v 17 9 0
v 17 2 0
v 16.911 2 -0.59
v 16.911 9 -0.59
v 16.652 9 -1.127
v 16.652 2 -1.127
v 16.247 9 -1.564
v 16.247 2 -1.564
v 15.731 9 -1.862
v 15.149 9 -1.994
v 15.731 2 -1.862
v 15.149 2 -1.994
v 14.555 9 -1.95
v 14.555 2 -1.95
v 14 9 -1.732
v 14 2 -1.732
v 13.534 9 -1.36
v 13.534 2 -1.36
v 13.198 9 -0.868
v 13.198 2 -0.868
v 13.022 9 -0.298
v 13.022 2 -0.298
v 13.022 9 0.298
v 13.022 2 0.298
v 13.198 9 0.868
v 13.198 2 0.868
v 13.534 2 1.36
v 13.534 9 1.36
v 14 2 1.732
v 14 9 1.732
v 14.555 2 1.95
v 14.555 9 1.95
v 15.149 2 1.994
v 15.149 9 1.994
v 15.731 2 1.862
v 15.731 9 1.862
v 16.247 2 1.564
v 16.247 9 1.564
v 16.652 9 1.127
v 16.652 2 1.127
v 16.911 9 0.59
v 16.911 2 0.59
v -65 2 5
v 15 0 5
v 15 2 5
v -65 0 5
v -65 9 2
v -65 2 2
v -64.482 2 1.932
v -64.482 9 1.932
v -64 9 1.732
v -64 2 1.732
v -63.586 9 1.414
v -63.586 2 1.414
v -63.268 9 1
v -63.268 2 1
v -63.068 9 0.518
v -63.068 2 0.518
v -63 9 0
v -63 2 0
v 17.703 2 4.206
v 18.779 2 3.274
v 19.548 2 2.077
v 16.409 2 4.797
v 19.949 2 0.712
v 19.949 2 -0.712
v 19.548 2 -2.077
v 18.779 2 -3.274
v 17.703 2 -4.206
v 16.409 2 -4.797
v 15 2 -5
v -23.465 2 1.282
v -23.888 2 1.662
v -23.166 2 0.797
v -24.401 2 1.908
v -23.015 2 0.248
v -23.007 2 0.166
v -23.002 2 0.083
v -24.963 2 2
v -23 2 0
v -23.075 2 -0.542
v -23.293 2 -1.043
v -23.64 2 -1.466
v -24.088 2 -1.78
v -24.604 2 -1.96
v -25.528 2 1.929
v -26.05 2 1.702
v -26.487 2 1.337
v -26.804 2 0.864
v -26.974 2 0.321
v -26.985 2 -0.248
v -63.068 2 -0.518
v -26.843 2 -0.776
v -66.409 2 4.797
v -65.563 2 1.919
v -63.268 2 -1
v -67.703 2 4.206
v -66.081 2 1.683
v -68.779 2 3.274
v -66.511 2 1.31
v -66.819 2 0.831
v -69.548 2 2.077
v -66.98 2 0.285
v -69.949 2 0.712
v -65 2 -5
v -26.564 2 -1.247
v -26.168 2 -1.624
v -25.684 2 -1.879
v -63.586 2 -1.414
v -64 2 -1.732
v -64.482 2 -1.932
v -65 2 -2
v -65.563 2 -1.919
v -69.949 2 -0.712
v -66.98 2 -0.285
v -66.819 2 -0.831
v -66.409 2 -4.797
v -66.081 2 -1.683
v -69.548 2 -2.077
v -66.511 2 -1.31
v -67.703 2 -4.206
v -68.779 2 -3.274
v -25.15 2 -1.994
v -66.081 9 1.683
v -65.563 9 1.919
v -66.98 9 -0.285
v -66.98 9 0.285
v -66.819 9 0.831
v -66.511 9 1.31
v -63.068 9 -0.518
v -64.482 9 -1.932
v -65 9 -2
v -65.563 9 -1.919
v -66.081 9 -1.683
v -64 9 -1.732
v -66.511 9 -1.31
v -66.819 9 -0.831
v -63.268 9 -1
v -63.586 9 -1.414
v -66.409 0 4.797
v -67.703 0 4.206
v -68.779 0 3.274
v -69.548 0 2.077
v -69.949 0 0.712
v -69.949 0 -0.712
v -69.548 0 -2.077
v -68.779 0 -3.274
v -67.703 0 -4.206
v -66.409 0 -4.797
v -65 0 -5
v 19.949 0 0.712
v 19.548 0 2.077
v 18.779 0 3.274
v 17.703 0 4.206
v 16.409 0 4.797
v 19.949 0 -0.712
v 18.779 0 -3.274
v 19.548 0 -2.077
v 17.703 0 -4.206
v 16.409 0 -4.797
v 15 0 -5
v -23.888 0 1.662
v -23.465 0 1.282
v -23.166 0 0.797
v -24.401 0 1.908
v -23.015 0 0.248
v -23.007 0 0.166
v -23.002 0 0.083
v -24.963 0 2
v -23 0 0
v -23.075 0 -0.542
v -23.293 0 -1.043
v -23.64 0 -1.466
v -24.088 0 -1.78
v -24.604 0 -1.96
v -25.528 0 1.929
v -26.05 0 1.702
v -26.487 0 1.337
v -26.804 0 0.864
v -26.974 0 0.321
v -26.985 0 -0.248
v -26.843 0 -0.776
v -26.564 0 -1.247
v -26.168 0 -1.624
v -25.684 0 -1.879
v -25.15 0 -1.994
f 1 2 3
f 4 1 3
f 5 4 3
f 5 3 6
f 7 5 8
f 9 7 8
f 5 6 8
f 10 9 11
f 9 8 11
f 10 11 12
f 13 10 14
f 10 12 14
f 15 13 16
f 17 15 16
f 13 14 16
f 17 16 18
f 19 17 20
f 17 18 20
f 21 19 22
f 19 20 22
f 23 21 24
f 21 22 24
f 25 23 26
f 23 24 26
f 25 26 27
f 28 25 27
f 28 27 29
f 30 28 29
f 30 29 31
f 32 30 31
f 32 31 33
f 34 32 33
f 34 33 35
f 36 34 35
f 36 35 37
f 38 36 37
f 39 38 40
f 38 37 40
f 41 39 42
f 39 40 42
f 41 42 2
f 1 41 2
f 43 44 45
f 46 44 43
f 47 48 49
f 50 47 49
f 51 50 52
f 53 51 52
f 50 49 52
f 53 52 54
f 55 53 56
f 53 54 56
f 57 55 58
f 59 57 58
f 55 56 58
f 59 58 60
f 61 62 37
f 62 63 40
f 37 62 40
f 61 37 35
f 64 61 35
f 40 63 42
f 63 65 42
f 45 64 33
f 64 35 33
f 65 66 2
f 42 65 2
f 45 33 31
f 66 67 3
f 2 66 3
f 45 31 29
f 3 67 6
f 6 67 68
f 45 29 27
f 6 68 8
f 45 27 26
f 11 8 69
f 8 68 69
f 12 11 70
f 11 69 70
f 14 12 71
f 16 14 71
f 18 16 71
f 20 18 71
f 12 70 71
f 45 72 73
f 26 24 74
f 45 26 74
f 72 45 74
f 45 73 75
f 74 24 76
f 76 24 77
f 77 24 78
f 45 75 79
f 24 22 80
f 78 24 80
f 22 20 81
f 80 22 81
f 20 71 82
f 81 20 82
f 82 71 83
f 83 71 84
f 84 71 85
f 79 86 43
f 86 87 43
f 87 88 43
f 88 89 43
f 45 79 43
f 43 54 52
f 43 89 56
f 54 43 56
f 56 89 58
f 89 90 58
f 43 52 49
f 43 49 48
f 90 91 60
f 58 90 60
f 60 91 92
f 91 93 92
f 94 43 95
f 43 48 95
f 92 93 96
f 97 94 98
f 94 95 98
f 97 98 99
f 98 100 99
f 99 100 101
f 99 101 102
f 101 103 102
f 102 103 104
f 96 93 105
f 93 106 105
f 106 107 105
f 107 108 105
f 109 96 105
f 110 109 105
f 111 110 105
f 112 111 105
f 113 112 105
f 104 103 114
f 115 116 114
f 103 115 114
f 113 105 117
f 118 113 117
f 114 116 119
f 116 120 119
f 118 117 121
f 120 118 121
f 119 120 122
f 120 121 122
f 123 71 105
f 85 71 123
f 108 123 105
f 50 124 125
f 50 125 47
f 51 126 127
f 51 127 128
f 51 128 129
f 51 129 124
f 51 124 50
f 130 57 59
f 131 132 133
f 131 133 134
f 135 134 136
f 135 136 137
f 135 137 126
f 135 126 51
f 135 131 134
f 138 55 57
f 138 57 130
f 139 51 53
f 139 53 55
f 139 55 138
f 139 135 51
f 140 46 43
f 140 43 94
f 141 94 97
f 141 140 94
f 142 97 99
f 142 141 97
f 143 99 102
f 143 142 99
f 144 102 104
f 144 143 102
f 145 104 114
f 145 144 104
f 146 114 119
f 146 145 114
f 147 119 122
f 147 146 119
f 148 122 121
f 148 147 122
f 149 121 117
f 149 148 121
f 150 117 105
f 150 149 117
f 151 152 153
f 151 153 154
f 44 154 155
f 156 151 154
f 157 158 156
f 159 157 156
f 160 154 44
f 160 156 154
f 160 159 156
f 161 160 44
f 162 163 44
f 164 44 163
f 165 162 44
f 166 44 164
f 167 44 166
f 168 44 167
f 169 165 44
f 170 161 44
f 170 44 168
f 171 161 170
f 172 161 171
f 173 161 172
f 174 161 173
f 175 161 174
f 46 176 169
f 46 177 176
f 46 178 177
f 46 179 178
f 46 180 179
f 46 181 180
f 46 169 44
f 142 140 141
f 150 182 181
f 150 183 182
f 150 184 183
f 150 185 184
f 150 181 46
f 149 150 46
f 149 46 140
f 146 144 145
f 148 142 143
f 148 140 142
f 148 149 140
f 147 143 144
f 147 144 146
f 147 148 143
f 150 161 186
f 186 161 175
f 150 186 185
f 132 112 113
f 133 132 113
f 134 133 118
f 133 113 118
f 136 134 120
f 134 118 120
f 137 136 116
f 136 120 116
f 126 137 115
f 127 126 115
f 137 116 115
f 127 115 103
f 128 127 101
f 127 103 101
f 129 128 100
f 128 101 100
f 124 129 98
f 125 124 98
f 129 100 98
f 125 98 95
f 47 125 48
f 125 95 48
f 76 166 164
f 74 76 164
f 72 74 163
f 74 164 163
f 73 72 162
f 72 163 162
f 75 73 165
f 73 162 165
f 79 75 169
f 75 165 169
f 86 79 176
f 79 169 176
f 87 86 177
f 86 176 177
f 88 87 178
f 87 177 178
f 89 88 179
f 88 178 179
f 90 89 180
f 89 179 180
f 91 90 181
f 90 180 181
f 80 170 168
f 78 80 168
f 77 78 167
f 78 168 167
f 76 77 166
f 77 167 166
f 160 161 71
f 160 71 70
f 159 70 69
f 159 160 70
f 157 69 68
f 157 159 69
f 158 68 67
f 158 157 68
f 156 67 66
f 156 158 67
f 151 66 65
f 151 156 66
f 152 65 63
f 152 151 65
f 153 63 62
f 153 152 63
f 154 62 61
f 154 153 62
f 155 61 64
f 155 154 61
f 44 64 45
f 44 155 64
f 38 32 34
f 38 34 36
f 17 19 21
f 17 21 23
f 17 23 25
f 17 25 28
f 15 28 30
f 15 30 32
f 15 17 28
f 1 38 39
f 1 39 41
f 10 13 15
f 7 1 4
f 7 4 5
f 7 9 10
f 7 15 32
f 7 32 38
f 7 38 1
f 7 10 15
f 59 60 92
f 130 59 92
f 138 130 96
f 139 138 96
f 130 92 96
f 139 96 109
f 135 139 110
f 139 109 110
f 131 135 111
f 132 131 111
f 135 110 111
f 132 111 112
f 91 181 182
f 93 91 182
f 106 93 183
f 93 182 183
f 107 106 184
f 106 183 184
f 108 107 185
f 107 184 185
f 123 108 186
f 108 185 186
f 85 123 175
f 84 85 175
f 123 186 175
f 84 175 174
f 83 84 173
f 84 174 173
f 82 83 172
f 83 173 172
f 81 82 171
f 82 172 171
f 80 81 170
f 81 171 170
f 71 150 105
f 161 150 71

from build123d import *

# Parameters (mm, degrees)
EXTRUDE_1_DEPTH     = 2
SKETCH_2_R          = 2
EXTRUDE_2_DEPTH     = 7
CUT_EXTRUDE_2_DEPTH = 10


with BuildPart() as part:
    # 草图1 → 凸台-拉伸1 (new body)
    with BuildSketch(Plane(origin=(0, 0, 0), x_dir=(1, 0, 0), z_dir=(0, 1, 0))):
        with BuildLine():
            Line((-65, 5), (15, 5))
            ThreePointArc((15, 5), (20, 0), (15, -5))
            Line((15, -5), (-65, -5))
            ThreePointArc((-65, -5), (-70, 0), (-65, 5))
        make_face()
    extrude(amount=EXTRUDE_1_DEPTH)

    # 草图2 → 凸台-拉伸2 (add)
    with BuildSketch(Plane(origin=(0, 2, 0), x_dir=(1, 0, 0), z_dir=(0, 1, 0))):
        with Locations((15, 0)):
            Circle(SKETCH_2_R)
        with BuildLine():
            ThreePointArc((-63, 0), (-63.585786438, 1.414213562), (-65, 2))
            Line((-65, 2), (-65, -2))
            ThreePointArc((-65, -2), (-63.585786438, -1.414213562), (-63, 0))
        make_face()
        with BuildLine():
            Line((-65, -2), (-65, 2))
            ThreePointArc((-65, 2), (-67, 0), (-65, -2))
        make_face()
    extrude(amount=EXTRUDE_2_DEPTH)

    # 草图4 → 切除-拉伸2 (cut)
    with BuildSketch(Plane.XZ):
        with BuildLine():
            ThreePointArc((-23.015444247, 0.248069469), (-25.248069469, 1.984555753), (-26.984555753, -0.248069469))
            Line((-26.984555753, -0.248069469), (-23.015444247, 0.248069469))
        make_face()
        with BuildLine():
            Line((-23.015444247, 0.248069469), (-26.984555753, -0.248069469))
            ThreePointArc((-26.984555753, -0.248069469), (-24.875725117, -1.996135204), (-23, 0))
            ThreePointArc((-23, 0), (-23.003864796, 0.124274883), (-23.015444247, 0.248069469))
        make_face()
    extrude(amount=-CUT_EXTRUDE_2_DEPTH, mode=Mode.SUBTRACT)


solid = part.part
